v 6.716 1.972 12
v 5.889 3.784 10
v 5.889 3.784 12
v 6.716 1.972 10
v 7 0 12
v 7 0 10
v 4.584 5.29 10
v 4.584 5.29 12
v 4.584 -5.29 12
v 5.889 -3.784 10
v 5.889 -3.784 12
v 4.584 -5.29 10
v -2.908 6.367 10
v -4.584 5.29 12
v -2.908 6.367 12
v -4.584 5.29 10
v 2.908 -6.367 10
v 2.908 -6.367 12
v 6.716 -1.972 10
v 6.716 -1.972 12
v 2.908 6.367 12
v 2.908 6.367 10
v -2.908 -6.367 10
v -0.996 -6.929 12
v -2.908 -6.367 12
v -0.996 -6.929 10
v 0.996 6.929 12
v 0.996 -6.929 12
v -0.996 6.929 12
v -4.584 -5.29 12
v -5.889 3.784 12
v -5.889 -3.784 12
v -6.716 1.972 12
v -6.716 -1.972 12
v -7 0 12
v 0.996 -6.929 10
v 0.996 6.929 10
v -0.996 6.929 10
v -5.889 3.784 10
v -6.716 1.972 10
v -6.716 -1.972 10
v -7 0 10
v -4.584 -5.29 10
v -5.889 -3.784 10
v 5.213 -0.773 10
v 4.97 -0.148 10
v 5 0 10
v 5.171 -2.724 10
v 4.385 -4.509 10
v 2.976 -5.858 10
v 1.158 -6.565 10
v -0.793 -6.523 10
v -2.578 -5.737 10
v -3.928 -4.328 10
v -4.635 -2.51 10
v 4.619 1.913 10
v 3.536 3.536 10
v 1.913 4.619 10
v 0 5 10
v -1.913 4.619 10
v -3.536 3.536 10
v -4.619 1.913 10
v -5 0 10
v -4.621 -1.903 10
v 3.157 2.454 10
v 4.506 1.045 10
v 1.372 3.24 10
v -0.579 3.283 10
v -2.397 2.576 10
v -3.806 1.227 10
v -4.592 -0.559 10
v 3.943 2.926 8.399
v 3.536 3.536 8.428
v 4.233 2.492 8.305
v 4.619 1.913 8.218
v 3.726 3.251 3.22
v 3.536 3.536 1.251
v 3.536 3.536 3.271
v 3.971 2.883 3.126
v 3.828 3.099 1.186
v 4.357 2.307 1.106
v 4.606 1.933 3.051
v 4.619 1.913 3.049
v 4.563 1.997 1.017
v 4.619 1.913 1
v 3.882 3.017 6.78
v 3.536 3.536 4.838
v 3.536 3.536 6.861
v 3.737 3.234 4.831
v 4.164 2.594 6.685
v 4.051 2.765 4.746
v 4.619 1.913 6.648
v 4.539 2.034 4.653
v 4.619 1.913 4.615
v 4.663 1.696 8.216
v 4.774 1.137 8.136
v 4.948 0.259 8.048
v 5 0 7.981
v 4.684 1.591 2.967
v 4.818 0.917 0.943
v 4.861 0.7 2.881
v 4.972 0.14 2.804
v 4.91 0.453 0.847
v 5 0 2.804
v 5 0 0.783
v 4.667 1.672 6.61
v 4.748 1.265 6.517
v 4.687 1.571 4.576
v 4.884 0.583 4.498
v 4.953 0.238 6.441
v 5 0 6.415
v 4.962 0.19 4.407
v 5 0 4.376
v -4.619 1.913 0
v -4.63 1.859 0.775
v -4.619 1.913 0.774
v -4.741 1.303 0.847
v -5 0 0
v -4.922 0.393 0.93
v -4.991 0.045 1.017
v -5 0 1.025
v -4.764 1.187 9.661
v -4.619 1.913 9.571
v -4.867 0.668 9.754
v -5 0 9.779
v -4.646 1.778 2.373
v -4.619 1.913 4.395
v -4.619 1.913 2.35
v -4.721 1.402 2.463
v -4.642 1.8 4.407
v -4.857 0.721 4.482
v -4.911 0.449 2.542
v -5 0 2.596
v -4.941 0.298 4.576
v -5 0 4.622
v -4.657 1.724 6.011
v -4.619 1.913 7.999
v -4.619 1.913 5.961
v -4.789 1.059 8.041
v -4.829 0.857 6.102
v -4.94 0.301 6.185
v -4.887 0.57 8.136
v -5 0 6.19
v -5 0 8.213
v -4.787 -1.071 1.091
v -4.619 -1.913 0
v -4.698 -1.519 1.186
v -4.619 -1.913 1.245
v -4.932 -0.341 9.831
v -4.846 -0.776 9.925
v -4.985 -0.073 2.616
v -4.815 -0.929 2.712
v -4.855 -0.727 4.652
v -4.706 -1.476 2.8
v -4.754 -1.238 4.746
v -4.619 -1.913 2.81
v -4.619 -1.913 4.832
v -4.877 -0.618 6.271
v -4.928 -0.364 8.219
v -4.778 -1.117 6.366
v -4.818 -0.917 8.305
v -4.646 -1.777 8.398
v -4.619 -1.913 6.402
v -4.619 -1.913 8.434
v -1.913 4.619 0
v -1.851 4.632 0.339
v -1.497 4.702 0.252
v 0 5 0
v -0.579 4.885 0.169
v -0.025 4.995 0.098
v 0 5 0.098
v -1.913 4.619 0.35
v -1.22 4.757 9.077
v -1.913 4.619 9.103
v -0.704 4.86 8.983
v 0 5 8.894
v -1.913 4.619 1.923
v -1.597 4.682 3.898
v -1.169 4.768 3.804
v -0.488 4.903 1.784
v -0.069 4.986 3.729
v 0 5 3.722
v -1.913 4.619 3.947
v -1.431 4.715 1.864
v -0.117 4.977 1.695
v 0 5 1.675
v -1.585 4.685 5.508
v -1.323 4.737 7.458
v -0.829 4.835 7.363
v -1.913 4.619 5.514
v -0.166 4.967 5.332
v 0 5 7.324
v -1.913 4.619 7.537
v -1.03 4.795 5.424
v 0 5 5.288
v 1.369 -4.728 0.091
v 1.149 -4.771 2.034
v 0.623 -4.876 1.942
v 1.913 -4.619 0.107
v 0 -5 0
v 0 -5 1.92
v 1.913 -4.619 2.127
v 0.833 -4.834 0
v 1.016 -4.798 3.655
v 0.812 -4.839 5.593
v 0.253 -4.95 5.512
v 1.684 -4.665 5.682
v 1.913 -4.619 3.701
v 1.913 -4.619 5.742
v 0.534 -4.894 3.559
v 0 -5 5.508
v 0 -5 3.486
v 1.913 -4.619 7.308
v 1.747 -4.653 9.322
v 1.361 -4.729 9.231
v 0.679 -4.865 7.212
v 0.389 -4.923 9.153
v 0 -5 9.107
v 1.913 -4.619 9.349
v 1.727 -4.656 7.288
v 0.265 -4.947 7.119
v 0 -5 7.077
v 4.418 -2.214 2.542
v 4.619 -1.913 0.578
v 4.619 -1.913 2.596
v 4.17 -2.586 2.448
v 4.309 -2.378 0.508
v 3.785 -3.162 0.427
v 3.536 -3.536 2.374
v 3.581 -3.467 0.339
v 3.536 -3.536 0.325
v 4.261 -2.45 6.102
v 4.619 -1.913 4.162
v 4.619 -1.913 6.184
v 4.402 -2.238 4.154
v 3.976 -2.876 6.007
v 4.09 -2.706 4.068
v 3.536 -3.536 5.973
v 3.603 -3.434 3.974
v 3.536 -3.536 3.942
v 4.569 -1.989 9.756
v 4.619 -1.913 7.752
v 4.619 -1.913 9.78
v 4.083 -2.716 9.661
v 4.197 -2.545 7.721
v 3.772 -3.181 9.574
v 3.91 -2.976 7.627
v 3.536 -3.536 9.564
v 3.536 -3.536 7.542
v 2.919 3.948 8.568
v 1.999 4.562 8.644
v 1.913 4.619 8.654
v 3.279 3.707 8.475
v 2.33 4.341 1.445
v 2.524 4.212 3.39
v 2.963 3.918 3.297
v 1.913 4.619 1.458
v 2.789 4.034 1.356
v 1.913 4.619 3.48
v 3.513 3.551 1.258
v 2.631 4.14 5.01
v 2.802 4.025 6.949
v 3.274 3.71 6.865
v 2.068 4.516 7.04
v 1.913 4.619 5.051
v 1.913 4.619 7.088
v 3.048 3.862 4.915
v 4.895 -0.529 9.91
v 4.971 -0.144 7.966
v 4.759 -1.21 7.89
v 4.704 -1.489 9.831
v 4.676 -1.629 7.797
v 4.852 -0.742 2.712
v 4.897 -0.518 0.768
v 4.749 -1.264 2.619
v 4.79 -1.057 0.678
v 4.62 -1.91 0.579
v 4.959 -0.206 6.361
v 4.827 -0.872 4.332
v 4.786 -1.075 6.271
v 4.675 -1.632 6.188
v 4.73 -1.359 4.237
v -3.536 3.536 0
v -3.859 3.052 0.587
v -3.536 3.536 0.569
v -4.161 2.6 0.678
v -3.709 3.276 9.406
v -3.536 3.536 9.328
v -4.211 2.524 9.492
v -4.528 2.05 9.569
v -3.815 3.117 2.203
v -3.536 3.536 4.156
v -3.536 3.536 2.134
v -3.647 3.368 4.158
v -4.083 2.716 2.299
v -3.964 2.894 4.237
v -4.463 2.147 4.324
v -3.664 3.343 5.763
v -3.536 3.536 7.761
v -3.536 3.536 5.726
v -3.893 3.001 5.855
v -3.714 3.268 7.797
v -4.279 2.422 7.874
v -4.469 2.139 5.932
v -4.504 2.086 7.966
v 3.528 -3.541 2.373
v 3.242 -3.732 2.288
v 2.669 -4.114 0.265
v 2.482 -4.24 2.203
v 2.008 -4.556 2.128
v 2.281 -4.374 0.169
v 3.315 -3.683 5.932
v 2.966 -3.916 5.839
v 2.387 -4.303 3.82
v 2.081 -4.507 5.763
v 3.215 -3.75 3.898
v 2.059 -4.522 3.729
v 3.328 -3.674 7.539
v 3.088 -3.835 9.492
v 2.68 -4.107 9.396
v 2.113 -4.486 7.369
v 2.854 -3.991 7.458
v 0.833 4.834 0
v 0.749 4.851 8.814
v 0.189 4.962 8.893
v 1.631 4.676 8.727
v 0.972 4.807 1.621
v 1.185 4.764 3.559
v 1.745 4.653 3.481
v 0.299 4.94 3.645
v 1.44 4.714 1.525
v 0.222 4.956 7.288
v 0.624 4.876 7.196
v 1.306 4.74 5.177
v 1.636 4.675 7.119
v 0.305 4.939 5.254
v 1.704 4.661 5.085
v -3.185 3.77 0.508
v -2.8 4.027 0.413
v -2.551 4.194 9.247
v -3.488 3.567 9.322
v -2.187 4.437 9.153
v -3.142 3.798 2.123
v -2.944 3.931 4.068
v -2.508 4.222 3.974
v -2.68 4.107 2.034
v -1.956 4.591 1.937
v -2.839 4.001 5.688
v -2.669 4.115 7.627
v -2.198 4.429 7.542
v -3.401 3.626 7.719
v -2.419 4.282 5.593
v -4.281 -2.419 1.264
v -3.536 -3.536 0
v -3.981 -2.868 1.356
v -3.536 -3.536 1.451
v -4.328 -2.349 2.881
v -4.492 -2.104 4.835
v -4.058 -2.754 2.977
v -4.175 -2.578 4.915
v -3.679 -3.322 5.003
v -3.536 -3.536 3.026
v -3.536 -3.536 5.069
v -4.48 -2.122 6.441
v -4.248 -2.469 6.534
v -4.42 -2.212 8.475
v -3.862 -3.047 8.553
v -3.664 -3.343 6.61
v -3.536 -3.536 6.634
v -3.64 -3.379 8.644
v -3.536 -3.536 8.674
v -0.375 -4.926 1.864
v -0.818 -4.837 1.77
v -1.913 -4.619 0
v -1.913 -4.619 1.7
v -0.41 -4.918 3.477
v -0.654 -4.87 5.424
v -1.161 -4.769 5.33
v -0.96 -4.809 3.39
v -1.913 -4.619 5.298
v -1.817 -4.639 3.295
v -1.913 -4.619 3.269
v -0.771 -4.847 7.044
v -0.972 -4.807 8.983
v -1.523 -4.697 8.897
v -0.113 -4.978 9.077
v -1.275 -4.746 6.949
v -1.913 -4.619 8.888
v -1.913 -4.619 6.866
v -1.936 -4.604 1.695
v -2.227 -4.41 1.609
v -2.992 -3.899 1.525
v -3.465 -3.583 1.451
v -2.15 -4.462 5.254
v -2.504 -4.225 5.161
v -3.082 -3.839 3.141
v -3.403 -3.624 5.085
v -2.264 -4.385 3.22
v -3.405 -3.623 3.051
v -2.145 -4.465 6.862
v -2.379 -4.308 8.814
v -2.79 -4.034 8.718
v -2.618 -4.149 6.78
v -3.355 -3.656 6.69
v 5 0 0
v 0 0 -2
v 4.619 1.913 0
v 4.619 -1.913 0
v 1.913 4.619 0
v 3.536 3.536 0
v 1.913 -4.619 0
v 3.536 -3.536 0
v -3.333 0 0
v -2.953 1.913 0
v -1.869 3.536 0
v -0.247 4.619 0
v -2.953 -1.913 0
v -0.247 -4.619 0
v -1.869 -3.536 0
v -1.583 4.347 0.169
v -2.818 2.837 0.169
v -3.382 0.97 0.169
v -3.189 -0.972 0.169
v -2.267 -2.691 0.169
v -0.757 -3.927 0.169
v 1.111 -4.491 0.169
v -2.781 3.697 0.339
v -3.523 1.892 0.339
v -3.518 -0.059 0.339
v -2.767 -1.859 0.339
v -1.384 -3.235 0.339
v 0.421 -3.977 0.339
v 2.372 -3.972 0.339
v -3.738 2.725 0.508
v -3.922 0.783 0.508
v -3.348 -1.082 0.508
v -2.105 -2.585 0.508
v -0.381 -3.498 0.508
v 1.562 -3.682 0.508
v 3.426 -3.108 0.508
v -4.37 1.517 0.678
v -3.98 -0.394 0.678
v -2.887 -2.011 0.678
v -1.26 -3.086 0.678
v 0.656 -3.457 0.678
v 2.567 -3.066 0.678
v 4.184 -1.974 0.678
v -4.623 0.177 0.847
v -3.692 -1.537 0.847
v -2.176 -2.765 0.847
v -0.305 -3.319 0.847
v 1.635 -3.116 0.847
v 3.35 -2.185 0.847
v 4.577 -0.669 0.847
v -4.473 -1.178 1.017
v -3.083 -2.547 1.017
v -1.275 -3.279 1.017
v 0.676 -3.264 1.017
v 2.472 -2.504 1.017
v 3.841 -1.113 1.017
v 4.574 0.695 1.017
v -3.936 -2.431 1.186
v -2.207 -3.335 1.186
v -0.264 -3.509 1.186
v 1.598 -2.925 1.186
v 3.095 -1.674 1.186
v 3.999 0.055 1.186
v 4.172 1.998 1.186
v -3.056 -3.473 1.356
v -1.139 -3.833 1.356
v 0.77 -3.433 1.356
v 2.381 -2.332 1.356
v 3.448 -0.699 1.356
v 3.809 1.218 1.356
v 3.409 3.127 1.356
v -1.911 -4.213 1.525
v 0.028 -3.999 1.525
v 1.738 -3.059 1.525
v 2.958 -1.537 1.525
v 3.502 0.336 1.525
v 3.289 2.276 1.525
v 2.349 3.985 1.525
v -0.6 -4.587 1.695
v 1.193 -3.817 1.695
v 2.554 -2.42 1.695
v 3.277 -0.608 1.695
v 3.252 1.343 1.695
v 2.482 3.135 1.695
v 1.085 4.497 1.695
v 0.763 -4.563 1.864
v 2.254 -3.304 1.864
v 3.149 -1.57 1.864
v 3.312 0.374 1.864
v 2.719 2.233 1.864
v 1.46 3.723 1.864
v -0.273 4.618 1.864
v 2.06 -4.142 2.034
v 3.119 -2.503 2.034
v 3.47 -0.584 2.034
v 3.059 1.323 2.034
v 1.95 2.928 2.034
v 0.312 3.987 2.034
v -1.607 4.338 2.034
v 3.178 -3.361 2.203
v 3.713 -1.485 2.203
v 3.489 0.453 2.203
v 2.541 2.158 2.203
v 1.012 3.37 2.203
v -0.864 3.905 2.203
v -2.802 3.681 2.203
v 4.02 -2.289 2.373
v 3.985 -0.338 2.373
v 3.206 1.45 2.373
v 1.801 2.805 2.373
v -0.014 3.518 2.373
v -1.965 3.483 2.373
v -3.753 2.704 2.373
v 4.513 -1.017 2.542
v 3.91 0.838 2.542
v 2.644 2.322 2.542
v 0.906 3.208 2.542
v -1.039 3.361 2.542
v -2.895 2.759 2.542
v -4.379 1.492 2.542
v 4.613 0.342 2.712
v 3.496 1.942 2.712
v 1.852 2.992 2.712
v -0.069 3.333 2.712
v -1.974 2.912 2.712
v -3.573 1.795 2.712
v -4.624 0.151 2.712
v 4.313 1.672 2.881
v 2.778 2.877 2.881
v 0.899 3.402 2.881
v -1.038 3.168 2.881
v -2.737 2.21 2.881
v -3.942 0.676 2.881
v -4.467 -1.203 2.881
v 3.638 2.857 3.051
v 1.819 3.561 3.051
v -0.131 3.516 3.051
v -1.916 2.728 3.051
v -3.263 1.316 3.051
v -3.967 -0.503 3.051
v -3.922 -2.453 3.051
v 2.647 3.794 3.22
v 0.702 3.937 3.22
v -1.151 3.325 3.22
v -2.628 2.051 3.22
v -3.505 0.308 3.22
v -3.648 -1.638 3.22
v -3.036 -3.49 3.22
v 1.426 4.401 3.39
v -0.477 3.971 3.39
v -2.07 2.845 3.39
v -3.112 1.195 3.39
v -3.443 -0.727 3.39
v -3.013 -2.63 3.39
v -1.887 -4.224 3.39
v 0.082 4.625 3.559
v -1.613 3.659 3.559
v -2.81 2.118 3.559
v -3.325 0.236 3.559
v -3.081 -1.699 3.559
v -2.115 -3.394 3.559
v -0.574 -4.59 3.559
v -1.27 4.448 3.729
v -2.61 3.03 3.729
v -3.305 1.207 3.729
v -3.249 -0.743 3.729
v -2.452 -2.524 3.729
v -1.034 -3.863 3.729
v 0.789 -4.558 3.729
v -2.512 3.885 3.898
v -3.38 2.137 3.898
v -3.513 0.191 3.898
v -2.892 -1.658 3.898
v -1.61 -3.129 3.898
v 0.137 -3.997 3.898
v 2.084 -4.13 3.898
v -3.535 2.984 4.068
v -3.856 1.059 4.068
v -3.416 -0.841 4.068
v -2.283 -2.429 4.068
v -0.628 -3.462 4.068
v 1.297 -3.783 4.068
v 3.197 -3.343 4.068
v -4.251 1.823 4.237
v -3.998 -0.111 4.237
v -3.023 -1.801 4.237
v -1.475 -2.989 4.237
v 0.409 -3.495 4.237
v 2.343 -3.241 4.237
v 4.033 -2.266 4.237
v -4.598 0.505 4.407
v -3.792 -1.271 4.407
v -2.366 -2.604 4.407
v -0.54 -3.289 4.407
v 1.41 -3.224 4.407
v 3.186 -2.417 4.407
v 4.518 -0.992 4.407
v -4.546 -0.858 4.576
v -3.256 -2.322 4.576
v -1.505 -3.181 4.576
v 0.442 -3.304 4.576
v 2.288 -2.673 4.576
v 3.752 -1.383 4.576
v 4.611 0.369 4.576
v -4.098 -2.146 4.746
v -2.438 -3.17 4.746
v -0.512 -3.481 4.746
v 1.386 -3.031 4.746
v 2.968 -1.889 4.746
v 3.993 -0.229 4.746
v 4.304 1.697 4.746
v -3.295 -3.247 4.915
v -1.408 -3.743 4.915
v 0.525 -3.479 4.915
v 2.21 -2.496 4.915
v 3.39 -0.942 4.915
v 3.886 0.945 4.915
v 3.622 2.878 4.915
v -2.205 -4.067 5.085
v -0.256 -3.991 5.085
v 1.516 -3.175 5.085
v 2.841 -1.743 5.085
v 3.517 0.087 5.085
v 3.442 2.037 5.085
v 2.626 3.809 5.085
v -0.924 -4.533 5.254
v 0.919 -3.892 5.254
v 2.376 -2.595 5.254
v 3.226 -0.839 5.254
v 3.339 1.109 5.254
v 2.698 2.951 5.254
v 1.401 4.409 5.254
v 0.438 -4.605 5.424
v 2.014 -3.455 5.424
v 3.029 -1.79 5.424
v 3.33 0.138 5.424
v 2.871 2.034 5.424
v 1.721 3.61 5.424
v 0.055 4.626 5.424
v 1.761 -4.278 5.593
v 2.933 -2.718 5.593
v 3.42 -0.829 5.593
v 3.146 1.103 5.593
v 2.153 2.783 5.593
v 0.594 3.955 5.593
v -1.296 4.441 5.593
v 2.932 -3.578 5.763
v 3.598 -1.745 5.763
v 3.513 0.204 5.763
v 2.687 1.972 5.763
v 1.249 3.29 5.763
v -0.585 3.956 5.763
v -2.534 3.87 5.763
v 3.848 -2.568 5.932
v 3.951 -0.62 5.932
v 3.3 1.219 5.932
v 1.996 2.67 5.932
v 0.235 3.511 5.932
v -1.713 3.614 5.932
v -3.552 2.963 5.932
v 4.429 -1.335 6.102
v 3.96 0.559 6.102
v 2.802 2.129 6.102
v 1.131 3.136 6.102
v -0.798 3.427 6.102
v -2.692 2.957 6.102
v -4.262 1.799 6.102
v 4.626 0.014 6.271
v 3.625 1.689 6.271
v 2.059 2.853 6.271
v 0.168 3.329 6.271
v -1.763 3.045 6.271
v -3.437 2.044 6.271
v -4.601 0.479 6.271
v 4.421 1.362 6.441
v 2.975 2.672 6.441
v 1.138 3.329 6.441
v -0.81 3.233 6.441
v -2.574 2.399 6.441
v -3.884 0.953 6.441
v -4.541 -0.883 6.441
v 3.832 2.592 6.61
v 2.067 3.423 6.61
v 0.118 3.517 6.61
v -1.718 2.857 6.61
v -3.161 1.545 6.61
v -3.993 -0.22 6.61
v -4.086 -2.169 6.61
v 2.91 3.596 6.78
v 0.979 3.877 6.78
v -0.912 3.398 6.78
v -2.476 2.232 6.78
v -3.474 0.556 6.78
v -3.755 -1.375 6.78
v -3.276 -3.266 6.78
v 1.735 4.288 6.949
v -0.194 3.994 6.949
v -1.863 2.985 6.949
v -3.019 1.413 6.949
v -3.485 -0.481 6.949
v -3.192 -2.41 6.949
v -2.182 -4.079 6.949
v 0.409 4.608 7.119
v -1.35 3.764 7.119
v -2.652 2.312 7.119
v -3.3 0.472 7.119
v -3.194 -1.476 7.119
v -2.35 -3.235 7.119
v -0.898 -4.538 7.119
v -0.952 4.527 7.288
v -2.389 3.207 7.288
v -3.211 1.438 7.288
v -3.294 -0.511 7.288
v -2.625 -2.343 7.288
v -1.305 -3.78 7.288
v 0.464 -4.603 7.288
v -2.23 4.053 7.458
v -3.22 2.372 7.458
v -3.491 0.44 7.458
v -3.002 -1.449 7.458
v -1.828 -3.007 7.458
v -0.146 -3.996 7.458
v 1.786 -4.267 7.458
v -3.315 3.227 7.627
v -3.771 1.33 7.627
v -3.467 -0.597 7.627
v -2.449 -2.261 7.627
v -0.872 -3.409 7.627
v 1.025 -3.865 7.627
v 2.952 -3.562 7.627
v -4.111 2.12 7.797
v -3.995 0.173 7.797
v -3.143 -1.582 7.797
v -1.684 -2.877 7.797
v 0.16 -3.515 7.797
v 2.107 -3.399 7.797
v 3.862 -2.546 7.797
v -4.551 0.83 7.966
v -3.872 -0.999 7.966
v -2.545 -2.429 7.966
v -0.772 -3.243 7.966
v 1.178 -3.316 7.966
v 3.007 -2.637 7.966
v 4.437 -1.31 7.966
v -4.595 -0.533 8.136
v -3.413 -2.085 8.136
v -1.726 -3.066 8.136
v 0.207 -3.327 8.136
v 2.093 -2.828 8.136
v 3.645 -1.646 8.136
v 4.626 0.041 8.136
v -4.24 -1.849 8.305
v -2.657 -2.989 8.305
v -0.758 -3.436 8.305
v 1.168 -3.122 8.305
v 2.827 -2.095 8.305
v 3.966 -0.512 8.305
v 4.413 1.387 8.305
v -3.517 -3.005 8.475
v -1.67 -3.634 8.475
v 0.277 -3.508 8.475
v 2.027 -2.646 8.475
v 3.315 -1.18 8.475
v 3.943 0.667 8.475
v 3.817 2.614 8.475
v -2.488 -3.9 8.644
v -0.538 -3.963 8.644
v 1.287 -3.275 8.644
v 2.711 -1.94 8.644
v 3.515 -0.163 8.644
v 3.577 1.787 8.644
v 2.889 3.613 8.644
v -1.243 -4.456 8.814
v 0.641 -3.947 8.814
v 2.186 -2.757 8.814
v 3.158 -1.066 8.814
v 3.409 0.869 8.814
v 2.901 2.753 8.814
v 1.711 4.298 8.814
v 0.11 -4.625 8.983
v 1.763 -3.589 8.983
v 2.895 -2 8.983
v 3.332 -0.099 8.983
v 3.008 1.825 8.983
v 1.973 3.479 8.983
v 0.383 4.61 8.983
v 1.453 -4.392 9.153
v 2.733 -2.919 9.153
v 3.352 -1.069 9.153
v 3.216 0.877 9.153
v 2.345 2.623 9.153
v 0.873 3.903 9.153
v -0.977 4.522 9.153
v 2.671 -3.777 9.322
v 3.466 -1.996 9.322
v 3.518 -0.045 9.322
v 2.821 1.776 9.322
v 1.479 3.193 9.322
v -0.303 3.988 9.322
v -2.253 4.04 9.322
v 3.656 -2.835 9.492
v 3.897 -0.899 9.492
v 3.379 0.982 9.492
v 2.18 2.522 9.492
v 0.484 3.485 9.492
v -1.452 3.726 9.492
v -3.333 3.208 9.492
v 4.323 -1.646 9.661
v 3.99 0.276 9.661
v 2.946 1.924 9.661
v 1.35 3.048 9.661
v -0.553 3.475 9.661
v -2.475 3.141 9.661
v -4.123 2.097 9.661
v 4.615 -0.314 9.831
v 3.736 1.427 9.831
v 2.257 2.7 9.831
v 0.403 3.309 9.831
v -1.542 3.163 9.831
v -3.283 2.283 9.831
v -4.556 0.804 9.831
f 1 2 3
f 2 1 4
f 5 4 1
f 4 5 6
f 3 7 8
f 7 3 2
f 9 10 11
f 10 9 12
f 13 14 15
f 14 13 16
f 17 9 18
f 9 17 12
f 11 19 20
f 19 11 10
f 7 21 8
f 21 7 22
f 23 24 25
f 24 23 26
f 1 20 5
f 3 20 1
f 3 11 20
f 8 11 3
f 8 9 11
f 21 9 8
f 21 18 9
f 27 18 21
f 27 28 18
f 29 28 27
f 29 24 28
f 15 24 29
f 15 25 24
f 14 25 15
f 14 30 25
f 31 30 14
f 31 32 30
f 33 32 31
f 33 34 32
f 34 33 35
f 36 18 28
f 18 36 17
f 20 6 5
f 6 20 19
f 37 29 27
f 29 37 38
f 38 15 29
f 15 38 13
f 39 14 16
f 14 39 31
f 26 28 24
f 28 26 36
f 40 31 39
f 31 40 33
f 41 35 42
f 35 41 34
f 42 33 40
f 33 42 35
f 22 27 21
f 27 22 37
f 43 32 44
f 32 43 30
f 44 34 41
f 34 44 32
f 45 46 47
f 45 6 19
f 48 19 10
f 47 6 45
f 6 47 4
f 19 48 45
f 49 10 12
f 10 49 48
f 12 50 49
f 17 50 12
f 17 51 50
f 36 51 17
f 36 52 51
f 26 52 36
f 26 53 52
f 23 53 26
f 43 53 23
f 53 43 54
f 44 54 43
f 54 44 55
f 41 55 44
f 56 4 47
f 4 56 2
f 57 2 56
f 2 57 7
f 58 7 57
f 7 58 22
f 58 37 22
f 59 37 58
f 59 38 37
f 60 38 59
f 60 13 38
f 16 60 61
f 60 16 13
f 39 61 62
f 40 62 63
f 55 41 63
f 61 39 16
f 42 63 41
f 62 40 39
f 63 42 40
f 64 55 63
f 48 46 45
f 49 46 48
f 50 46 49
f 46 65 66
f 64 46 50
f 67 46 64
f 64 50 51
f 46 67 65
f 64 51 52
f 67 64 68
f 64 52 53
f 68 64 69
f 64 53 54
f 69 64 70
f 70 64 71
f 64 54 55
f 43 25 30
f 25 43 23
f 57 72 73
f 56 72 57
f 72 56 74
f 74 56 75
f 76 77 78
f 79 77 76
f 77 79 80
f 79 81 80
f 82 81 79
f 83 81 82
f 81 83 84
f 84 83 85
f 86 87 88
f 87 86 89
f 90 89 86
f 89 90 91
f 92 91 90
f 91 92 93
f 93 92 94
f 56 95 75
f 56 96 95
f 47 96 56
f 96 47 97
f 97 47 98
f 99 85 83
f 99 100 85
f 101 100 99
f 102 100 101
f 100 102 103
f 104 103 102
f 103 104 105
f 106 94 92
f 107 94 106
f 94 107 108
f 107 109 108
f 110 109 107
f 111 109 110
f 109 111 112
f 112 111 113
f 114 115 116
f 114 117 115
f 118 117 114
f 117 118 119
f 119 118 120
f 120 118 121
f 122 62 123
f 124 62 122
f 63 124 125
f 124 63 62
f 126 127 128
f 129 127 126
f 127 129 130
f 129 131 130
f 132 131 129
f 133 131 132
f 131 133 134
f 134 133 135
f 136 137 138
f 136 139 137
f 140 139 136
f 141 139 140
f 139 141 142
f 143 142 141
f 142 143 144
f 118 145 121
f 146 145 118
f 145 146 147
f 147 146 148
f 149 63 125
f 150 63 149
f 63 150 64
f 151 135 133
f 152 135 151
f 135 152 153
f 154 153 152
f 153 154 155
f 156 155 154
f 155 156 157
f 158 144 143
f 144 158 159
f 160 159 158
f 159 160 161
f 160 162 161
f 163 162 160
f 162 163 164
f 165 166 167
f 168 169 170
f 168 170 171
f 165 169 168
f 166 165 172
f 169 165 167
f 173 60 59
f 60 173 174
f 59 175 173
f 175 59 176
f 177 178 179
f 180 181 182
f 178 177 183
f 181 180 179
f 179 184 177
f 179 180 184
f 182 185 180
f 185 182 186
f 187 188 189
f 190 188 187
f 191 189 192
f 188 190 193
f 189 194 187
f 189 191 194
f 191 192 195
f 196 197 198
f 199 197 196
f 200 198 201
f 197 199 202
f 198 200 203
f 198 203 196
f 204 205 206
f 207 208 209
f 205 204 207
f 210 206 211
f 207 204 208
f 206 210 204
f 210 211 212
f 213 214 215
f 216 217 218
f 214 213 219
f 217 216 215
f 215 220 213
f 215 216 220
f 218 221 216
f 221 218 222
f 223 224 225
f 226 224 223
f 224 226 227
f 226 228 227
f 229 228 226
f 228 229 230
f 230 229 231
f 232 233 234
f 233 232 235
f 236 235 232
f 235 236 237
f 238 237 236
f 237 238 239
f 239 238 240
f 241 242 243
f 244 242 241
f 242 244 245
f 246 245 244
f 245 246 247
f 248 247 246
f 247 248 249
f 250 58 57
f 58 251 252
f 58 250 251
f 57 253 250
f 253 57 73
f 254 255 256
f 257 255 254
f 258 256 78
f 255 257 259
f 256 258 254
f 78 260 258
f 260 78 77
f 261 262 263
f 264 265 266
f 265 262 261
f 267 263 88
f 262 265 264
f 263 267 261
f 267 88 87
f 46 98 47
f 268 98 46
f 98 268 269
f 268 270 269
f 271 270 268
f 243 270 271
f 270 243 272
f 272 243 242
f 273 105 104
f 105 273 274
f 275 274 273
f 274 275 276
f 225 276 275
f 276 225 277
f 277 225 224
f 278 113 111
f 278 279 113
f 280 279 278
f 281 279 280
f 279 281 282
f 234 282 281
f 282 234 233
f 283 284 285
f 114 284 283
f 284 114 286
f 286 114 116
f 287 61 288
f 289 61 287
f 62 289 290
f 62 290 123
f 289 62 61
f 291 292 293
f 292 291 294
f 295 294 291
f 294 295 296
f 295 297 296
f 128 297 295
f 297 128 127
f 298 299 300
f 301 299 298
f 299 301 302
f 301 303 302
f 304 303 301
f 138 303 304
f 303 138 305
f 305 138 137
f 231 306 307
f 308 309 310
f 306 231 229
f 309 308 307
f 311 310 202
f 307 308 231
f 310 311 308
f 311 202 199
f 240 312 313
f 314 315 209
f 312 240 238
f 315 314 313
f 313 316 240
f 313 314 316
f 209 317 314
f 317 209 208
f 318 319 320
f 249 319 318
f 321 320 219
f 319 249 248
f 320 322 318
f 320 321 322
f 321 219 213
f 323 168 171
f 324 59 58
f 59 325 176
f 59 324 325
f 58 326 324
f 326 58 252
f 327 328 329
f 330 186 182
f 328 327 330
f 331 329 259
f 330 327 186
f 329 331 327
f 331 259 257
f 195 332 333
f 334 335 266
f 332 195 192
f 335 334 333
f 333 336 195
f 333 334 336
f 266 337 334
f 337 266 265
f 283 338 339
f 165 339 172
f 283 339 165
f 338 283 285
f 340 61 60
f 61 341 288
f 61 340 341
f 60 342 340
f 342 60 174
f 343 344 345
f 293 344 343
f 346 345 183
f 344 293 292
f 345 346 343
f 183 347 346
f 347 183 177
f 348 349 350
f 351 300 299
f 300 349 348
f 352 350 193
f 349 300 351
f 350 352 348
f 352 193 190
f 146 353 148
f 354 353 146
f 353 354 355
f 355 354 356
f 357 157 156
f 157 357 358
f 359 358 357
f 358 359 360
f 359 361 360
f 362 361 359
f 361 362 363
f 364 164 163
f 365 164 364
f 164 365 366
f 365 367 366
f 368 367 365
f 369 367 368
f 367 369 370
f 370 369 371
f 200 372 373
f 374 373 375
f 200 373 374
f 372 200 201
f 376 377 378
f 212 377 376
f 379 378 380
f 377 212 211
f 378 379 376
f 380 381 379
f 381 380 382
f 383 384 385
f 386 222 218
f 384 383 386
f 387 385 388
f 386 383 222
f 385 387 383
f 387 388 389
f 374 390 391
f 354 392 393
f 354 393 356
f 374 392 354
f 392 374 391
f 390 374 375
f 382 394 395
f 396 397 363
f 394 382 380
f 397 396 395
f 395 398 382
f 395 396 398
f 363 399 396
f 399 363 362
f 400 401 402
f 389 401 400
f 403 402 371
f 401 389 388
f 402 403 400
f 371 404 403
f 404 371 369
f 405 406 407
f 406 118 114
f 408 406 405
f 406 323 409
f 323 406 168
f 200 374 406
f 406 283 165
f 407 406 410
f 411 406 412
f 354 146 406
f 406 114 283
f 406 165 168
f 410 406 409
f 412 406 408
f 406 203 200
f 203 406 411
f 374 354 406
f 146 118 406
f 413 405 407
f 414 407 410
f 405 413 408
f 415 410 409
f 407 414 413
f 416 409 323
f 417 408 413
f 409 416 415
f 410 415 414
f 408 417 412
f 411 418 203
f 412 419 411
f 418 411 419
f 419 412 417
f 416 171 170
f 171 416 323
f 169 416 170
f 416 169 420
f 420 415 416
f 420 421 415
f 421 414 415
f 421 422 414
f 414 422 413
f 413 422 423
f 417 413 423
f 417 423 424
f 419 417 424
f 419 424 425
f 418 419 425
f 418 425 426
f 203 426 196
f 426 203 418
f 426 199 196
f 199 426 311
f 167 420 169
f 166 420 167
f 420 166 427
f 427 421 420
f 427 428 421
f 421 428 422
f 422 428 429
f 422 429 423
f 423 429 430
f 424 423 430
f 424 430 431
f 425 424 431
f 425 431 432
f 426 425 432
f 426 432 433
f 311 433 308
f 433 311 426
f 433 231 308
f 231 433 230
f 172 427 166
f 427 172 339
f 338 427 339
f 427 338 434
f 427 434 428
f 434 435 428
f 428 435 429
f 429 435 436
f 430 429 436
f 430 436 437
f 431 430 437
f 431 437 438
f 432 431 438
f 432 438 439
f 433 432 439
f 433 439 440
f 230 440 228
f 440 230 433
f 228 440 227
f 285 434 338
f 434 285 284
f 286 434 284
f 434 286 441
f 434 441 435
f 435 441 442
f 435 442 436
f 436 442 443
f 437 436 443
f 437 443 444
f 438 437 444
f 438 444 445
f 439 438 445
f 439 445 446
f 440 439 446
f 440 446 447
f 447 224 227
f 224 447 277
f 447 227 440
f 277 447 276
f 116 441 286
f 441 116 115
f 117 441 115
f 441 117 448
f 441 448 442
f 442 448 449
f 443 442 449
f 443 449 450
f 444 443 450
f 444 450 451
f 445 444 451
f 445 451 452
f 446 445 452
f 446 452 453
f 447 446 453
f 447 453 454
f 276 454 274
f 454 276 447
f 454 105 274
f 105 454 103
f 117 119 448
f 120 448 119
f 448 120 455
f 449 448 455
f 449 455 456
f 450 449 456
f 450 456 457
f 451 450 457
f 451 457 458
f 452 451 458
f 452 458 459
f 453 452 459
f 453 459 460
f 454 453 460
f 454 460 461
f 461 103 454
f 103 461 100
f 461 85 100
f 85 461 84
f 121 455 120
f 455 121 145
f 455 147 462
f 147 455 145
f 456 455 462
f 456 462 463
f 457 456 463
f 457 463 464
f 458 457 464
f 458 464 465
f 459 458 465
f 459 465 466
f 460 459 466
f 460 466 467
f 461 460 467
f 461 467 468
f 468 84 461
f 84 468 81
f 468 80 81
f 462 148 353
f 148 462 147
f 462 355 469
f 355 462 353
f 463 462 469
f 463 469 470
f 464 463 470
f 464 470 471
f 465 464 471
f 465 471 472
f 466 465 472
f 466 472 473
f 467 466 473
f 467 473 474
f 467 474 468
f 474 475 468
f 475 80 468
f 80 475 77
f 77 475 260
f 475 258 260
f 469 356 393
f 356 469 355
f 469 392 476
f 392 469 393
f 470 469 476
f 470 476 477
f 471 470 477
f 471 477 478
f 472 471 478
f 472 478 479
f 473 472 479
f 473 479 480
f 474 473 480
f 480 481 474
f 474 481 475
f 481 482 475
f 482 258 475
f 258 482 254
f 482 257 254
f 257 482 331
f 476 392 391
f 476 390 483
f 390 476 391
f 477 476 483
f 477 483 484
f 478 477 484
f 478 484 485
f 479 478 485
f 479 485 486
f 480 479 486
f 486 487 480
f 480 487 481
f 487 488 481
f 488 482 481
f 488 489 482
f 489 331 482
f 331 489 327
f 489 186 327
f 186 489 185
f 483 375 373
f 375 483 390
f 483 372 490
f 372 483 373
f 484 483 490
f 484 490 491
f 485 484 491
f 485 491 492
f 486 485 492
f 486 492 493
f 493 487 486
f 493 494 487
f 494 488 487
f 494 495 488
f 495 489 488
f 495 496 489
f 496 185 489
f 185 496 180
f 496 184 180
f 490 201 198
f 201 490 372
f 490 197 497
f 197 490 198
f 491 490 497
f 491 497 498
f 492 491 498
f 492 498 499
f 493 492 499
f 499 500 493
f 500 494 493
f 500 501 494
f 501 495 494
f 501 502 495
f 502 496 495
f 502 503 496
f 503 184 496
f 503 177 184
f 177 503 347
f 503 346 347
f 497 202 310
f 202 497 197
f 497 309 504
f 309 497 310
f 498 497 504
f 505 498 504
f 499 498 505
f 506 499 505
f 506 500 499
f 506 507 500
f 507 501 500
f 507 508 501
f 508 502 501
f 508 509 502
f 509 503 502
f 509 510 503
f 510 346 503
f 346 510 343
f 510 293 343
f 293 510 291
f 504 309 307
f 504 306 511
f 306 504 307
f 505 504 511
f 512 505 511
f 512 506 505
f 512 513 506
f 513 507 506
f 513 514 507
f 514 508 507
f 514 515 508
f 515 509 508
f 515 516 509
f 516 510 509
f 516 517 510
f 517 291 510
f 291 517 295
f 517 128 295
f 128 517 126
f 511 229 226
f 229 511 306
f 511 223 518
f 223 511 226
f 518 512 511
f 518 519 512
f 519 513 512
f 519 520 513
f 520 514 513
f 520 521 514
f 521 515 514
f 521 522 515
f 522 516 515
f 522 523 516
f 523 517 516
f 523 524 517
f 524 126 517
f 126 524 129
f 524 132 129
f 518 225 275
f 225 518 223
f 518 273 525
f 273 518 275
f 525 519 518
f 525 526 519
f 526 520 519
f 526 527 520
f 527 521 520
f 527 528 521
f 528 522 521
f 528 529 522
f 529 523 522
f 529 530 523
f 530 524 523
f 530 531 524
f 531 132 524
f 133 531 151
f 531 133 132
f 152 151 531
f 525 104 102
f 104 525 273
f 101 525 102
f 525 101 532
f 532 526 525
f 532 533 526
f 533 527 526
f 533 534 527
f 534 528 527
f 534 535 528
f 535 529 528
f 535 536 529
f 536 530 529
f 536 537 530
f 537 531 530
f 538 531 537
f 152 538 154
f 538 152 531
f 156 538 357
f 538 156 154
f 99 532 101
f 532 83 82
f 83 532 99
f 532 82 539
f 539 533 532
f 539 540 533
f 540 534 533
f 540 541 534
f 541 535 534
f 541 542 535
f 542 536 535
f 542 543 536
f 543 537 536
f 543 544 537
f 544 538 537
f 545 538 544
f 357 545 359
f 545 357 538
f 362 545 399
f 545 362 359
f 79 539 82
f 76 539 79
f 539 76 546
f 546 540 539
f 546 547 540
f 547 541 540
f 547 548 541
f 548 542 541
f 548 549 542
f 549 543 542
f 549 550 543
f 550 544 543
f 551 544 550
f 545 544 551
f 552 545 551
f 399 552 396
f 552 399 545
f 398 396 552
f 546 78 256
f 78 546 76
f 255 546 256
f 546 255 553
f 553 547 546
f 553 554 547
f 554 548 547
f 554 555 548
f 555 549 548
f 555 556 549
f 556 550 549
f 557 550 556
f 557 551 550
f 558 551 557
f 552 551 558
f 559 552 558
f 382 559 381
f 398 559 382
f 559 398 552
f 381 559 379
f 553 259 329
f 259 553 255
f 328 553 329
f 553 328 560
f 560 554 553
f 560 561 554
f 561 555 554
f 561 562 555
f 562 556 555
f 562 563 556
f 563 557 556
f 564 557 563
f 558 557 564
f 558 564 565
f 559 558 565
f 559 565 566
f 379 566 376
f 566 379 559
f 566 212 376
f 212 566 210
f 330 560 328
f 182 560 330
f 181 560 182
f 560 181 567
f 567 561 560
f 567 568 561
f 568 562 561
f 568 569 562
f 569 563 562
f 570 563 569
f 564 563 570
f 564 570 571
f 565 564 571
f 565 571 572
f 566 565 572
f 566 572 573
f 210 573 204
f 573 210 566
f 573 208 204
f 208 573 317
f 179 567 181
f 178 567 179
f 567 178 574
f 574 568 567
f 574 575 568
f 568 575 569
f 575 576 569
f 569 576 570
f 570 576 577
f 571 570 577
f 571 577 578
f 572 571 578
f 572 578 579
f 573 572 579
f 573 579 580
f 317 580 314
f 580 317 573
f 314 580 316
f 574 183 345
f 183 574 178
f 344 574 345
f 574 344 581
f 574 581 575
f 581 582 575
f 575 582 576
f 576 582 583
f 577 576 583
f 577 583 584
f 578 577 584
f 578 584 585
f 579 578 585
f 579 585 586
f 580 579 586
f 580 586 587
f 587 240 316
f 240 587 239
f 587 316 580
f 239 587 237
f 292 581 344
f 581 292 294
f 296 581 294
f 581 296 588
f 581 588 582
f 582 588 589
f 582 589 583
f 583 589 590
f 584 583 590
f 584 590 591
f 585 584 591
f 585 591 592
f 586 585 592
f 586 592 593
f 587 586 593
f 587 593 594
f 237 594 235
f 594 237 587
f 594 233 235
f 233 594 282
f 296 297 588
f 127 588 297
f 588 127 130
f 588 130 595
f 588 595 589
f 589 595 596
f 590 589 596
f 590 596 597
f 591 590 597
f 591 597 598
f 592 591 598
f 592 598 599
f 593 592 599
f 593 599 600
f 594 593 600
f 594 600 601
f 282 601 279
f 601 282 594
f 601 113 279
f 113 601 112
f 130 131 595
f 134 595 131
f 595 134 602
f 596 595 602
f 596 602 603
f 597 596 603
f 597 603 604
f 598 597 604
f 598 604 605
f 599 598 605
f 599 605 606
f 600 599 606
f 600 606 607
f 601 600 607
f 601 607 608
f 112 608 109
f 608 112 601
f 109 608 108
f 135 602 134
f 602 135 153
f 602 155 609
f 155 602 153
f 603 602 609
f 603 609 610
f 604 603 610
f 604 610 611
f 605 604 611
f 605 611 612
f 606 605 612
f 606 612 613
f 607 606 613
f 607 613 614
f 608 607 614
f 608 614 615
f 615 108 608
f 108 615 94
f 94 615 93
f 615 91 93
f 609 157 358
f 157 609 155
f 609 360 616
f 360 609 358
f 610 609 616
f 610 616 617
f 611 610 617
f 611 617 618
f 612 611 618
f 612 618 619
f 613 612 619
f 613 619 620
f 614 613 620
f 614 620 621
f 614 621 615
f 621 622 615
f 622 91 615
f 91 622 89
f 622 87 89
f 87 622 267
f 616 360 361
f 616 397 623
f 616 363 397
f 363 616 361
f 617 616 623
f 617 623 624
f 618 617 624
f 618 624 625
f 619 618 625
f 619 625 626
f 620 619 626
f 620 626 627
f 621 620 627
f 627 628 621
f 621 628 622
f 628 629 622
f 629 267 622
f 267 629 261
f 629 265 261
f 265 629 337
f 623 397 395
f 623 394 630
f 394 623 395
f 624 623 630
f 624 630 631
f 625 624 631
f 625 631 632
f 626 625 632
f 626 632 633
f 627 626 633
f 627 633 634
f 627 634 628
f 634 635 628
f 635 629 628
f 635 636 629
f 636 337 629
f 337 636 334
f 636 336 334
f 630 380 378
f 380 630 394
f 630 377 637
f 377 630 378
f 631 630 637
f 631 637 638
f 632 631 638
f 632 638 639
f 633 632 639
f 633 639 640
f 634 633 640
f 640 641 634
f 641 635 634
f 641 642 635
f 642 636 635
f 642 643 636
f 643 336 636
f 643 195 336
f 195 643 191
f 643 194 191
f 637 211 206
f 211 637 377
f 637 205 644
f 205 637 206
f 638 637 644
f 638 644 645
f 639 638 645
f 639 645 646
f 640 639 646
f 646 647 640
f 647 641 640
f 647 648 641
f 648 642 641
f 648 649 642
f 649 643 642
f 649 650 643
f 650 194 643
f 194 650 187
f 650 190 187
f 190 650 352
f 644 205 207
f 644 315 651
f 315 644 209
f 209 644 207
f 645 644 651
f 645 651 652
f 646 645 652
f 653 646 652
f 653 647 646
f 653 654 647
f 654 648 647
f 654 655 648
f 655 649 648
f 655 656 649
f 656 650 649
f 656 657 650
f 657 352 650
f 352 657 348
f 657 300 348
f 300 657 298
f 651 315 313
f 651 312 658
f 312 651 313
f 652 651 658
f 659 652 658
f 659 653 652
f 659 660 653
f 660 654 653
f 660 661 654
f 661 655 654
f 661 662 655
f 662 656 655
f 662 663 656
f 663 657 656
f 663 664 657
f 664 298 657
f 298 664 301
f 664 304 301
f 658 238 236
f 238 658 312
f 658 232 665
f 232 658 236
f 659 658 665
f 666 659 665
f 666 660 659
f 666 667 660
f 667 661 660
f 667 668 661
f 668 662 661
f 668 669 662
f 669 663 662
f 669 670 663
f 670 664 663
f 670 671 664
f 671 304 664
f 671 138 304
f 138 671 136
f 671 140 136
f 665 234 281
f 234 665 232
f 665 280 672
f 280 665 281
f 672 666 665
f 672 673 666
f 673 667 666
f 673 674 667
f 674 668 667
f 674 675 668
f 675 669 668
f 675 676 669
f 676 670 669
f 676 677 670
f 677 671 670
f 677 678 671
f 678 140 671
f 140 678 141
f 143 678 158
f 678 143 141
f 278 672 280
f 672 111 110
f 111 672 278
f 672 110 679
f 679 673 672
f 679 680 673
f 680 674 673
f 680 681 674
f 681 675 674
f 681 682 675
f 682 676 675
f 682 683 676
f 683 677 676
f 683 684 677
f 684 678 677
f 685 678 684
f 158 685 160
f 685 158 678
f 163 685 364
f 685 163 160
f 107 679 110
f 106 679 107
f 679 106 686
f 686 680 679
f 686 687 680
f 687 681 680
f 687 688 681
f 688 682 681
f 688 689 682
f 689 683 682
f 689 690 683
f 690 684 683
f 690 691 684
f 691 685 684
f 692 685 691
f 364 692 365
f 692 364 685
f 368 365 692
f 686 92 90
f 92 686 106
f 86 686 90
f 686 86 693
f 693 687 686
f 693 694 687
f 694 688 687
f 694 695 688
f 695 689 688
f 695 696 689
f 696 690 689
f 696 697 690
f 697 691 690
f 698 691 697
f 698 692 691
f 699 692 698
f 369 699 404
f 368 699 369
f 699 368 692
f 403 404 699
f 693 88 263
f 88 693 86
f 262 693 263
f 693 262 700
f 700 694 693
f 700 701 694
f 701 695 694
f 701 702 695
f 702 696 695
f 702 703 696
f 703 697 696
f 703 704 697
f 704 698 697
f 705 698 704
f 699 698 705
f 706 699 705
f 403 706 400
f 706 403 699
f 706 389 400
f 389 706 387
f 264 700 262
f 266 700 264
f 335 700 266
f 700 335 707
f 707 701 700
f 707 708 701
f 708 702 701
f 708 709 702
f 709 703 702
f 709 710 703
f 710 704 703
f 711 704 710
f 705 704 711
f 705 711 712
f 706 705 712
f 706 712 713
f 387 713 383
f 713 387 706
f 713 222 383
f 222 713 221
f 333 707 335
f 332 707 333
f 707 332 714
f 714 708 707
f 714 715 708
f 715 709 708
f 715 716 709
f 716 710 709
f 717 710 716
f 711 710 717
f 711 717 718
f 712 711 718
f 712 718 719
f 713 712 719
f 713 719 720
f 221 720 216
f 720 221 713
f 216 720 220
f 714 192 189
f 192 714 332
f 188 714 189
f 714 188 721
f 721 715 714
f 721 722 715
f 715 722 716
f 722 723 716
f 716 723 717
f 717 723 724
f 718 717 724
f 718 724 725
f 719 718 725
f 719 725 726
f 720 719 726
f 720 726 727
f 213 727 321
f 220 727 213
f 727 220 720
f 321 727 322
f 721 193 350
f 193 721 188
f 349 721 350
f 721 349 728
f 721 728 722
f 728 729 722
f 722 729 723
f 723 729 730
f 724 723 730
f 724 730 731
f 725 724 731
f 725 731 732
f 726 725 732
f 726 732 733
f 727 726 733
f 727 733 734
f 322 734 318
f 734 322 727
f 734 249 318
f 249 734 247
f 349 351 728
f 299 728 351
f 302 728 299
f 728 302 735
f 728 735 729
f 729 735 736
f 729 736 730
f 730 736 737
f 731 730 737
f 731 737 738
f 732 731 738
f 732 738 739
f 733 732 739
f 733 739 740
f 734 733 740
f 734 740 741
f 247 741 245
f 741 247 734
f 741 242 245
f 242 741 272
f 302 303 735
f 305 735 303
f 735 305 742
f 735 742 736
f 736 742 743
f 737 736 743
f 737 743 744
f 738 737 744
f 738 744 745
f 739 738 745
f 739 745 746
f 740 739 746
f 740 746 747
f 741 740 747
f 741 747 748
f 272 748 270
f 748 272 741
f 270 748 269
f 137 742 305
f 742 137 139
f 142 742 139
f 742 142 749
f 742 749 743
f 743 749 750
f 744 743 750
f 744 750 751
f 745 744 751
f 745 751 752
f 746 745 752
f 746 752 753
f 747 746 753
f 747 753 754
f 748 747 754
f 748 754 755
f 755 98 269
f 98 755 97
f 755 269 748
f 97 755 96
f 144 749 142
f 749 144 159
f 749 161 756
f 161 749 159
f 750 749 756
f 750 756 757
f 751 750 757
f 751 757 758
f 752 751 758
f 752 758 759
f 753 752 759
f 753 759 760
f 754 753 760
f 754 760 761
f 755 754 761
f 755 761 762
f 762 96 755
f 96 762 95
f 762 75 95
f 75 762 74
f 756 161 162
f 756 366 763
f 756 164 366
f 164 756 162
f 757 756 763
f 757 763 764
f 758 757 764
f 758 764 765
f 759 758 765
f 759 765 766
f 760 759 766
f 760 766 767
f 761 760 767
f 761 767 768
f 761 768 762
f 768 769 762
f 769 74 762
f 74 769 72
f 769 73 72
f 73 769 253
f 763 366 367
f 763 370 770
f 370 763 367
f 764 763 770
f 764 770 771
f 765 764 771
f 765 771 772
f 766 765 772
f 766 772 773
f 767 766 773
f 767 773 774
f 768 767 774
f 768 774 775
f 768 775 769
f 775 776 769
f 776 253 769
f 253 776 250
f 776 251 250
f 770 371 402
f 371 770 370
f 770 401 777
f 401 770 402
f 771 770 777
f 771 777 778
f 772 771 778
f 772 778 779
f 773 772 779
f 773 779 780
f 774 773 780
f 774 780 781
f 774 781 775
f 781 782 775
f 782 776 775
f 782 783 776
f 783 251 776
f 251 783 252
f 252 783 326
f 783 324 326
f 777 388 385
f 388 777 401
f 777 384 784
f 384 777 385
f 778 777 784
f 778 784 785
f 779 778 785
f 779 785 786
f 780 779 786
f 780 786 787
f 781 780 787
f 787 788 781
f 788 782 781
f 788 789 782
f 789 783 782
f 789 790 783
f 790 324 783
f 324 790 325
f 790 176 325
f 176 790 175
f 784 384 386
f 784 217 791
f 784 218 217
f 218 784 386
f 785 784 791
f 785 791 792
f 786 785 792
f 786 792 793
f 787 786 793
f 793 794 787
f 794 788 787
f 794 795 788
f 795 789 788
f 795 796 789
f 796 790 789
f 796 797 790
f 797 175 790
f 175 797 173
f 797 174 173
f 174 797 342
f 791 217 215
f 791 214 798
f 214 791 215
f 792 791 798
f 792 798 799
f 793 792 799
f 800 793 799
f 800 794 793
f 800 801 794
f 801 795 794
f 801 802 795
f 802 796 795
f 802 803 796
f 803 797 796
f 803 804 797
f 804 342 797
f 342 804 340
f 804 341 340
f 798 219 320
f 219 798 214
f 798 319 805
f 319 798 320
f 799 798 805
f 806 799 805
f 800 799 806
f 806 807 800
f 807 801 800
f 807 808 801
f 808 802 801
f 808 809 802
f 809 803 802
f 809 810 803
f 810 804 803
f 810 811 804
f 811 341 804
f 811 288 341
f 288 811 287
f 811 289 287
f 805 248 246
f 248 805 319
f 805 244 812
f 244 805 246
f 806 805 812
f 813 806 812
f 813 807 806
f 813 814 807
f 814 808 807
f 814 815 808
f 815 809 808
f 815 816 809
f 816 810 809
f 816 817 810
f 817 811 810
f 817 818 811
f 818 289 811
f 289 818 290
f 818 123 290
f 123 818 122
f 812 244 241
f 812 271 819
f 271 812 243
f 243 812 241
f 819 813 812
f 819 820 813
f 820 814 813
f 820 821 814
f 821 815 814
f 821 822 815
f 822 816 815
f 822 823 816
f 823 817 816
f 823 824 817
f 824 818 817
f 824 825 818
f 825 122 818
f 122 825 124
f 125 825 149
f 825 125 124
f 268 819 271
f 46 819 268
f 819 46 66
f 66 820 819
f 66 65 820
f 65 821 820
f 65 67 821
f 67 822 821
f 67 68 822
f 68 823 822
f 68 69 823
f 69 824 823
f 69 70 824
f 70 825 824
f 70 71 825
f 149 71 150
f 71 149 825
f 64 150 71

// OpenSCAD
// test comment vanuit openscad..

vijs_hoogte = 10;
vijs_dikte = 5;
punt_hoogte = 2;
kop_hoogte = 2; // test 2
kop_dikte = 7;
draad_dikte = 2;
//extra comment
module vijs_schacht(vijs_hoogte,vijs_dikte) {

	cylinder(vijs_hoogte,vijs_dikte,vijs_dikte);
	

}

module vijs_punt(punt_hoogte,vijs_dikte) {
	
	translate([0,0,-punt_hoogte]) cylinder(punt_hoogte,0,vijs_dikte);


}

module vijs_kop(kop_hoogte,kop_dikte) {
	translate([0,0,vijs_hoogte]) 
	cylinder(kop_hoogte,kop_dikte,kop_dikte);
	
}

module vijs_basis() {
vijs_kop(kop_hoogte,kop_dikte);
vijs_schacht(vijs_hoogte,vijs_dikte);
vijs_punt(punt_hoogte,vijs_dikte);
}

module vijs_draad() {
	
	linear_extrude(height = vijs_hoogte, center = false, convexity = 10, twist = -1000) translate([10/6,0,0]) circle(5);

}

difference() {
vijs_basis();
vijs_draad() ;
}
